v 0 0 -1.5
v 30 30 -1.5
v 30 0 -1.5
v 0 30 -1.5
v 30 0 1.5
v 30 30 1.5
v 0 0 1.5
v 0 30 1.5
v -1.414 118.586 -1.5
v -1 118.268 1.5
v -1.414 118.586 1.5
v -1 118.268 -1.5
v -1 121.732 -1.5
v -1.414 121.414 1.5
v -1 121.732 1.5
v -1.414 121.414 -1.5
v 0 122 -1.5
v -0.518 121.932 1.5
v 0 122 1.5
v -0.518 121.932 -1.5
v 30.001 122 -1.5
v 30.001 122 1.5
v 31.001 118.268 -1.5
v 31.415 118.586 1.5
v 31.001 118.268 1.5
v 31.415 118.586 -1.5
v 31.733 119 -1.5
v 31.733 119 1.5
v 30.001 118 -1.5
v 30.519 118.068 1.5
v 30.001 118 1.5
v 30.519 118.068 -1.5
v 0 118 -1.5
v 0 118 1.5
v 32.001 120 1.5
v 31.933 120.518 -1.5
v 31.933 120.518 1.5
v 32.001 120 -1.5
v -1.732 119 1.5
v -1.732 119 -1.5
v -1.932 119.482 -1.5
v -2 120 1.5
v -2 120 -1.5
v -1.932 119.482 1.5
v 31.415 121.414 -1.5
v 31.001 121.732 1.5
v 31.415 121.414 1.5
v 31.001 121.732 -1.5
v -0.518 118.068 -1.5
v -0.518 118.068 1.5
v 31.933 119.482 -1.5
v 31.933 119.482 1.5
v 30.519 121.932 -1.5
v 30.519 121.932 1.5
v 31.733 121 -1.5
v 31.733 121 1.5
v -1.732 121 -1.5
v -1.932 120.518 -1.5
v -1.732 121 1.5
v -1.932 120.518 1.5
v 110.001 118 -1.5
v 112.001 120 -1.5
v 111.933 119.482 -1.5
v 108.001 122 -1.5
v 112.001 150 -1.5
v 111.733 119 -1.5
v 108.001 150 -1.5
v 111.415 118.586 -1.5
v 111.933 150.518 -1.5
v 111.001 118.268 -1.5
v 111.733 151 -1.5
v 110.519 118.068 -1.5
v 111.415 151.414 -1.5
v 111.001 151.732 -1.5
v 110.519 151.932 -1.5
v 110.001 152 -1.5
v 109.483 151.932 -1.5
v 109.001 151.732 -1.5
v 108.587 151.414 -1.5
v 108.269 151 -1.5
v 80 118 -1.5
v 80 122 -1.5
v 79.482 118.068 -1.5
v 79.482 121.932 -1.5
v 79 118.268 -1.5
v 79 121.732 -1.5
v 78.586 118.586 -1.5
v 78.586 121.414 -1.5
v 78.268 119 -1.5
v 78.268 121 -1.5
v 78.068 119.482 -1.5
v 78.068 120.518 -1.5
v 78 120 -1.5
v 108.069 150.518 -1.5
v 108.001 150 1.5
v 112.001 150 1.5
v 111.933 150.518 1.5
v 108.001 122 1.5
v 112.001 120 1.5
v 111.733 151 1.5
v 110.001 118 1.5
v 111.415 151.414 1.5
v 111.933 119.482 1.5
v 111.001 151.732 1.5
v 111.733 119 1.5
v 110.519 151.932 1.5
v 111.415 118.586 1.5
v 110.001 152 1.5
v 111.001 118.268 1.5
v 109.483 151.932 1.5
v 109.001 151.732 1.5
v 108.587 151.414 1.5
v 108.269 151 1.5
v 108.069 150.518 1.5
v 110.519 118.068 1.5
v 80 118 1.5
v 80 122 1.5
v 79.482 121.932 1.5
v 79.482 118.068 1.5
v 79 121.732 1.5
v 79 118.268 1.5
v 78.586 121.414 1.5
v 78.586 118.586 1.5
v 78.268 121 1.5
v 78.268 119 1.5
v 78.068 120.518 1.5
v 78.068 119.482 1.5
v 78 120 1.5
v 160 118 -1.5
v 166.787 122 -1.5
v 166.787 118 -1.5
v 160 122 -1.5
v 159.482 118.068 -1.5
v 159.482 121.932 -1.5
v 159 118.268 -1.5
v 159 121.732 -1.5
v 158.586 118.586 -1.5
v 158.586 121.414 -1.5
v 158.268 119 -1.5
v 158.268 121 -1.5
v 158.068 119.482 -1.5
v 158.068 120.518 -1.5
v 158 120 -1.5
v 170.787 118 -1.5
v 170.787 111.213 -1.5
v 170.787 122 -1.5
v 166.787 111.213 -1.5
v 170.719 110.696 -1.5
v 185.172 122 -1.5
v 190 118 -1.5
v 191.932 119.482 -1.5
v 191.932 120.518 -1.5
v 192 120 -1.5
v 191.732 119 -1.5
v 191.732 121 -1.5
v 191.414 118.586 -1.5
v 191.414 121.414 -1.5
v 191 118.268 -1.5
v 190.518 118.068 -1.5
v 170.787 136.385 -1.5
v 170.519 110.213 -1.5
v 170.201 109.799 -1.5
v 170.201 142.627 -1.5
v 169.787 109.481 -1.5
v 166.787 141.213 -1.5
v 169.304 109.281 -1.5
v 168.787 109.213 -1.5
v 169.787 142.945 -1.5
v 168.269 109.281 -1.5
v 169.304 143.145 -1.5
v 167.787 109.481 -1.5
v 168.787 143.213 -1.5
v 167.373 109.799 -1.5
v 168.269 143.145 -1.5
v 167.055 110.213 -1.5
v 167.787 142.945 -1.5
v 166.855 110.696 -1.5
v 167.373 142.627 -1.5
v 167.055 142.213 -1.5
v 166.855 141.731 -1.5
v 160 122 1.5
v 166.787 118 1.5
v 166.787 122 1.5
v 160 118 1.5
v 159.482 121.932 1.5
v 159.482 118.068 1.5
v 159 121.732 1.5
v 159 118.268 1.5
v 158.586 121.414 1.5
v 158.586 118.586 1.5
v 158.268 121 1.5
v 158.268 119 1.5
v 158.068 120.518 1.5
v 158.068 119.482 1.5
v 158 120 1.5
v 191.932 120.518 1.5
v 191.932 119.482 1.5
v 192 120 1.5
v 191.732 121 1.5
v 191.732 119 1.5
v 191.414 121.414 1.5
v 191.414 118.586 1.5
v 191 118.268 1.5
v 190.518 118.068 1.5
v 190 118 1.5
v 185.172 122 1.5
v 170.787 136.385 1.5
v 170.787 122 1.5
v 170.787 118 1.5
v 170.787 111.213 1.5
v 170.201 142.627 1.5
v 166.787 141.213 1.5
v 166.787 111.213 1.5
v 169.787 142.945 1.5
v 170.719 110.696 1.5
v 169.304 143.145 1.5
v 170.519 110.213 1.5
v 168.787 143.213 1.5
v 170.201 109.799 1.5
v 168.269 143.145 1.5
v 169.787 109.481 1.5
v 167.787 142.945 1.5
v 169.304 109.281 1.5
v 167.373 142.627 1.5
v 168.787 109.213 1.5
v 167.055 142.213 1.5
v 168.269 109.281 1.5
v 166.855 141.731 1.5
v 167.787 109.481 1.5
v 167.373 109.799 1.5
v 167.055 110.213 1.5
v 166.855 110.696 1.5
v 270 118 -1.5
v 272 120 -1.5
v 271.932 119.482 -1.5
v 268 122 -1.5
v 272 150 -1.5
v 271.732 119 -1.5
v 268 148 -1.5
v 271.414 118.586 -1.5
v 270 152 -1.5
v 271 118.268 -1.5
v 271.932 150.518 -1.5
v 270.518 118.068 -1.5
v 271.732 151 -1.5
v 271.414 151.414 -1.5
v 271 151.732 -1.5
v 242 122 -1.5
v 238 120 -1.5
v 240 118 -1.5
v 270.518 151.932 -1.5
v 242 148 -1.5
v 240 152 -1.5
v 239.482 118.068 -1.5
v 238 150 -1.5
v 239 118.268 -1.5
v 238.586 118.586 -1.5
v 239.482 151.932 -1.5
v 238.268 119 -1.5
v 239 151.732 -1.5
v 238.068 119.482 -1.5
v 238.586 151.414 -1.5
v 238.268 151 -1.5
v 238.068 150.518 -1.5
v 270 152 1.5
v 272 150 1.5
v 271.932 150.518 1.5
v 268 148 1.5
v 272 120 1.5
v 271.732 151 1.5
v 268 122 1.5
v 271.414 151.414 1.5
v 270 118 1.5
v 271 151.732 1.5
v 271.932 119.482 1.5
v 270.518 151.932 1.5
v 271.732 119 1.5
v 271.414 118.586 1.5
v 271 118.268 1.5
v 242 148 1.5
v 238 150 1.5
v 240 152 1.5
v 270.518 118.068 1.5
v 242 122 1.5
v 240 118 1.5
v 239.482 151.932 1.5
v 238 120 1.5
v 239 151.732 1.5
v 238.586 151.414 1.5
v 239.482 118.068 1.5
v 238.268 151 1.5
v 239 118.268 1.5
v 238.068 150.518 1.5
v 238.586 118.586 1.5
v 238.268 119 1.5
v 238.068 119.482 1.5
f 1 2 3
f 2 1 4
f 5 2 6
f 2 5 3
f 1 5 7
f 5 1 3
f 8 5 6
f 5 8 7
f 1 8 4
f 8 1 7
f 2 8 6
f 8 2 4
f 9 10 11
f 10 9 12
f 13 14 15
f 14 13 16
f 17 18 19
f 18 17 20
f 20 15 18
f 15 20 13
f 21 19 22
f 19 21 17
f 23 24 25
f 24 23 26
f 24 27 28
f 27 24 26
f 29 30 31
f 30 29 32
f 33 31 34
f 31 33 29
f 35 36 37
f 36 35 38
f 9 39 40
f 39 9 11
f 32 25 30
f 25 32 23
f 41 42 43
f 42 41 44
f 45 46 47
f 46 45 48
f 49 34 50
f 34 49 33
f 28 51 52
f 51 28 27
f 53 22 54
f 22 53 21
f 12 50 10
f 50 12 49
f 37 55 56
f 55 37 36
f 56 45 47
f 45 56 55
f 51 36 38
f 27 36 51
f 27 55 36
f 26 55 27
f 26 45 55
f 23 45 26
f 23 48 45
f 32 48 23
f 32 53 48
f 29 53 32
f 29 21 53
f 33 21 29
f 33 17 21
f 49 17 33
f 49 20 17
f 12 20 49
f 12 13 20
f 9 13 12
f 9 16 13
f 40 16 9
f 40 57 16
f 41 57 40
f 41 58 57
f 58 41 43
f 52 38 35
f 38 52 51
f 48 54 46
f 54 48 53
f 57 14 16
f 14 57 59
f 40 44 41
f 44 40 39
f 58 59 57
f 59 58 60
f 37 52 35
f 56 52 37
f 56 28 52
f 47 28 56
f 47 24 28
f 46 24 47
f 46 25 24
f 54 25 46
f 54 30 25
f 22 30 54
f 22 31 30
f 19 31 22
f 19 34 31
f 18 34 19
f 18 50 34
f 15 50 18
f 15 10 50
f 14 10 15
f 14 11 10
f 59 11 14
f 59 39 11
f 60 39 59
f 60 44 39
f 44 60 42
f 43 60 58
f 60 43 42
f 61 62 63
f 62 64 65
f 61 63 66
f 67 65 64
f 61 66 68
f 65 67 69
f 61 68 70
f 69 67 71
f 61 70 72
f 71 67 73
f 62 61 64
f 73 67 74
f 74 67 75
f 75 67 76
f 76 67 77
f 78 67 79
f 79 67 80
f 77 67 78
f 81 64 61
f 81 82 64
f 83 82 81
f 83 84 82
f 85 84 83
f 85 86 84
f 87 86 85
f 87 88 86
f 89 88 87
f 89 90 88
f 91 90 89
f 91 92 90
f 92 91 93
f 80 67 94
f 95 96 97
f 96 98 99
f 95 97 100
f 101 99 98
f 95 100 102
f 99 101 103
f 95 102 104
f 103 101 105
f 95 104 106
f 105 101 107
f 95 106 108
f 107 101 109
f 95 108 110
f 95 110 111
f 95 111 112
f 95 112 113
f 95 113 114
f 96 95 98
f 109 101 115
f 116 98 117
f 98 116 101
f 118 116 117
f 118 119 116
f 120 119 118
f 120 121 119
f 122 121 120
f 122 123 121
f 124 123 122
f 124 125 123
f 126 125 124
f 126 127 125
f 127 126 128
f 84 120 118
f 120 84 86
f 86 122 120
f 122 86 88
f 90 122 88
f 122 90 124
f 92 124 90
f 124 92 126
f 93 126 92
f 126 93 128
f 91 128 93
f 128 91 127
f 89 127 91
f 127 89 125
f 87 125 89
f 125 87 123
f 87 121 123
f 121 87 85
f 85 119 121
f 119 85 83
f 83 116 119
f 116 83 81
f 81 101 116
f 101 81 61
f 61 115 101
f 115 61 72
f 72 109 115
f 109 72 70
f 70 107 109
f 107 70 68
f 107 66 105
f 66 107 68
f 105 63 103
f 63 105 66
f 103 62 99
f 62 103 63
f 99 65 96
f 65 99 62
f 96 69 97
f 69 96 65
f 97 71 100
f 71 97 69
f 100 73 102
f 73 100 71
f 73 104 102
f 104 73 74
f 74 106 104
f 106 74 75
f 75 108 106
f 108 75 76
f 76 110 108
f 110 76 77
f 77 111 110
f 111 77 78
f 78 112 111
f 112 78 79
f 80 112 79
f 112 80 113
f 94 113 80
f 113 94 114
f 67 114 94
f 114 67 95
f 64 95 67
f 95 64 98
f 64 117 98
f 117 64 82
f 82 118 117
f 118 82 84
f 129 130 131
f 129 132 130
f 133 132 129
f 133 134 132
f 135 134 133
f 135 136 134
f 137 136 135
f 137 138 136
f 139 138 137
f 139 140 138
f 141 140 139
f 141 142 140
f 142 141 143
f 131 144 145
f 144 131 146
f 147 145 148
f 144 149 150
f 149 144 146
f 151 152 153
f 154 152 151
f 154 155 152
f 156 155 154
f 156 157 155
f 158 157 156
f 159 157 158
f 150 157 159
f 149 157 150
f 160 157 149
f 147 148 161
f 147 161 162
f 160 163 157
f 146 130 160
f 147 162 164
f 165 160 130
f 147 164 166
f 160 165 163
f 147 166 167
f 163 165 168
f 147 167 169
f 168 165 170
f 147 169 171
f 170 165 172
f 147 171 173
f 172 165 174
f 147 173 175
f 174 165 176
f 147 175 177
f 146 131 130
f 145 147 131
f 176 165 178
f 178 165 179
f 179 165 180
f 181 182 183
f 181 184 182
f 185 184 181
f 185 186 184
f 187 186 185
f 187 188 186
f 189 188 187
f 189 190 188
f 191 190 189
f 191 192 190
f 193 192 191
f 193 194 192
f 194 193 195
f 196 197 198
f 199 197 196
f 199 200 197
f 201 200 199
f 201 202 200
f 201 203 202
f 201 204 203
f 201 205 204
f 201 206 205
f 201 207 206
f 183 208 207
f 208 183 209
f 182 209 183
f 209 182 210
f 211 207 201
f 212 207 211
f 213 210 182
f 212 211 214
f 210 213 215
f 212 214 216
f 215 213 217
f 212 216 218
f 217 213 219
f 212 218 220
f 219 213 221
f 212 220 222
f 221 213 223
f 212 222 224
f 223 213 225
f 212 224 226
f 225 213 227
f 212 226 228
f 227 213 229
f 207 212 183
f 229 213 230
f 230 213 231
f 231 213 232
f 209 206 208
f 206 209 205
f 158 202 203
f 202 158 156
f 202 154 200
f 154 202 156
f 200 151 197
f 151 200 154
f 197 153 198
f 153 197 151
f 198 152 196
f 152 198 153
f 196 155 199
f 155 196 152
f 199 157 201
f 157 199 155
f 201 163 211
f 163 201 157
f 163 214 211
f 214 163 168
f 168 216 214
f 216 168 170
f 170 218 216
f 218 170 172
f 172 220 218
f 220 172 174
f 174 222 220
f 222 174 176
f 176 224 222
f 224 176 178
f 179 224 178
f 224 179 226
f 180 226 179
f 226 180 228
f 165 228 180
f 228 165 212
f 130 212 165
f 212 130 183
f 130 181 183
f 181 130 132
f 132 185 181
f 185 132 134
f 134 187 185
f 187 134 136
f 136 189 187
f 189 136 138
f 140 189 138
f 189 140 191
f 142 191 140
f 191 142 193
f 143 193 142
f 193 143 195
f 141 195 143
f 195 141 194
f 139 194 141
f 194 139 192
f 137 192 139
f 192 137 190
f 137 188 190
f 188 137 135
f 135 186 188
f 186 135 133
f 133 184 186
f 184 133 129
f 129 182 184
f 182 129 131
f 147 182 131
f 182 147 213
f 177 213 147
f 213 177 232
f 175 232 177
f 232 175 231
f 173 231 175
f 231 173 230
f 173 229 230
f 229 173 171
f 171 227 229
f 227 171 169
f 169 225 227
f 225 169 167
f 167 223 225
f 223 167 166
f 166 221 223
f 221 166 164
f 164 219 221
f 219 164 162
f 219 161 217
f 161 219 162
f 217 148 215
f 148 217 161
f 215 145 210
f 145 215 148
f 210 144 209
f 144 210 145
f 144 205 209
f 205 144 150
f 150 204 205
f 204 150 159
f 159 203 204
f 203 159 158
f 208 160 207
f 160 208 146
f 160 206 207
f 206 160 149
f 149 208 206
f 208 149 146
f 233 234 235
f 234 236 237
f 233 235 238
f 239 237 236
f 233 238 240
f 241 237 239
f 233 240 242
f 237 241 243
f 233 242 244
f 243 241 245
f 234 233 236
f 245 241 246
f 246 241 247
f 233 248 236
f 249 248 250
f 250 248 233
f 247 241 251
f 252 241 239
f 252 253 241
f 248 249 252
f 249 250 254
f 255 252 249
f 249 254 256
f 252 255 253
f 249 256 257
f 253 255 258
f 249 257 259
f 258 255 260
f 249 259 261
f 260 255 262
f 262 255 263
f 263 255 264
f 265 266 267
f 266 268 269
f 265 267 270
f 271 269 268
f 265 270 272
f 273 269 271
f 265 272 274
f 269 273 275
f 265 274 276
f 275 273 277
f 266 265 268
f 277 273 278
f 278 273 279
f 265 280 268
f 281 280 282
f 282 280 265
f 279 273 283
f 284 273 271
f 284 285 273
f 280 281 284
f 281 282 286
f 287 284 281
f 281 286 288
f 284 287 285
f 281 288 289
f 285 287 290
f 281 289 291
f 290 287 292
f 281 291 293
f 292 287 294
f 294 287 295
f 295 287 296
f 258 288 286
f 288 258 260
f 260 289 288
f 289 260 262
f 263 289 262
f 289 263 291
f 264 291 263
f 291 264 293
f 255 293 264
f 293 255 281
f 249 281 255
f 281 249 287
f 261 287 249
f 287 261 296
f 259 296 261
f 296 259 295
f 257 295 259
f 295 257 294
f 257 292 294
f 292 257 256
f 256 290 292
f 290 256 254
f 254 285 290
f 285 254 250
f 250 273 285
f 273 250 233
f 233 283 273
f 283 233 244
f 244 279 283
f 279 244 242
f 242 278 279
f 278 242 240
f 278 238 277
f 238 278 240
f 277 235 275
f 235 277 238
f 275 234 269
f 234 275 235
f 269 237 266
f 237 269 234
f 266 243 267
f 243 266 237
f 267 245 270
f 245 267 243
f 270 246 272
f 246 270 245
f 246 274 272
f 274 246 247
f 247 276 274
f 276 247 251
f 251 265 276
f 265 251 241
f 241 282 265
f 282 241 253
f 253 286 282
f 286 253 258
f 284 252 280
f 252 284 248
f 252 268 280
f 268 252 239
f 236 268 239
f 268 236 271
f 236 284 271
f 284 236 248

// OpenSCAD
// ============================================================================
// LogoSC-Experiments.scad
//
// Experimental and exploratory tests for LogoSC.
//
// This file is meant to be opened directly in OpenSCAD. It imports the current
// LogoSC core, defines small experimental command lists, and renders them with
// RenderAllLogoExperiments().
//
// Keep experimental work here until it is stable enough to move into the core,
// formal tests, or the main examples gallery.
// ============================================================================

// Keep the regression-test grid and trace output out of the experiments view
// when this file is opened directly.
include <LogoSC-Foundation-Core.scad>
LogoSCRunMode = "NoDemo";
TraceLevel = 0; // [0:4]

// -----------------------------------------------------------------------------
// Experiment controls
// -----------------------------------------------------------------------------

RunLogoExperiments = true;

LogoExperimentHeight = 3;
LogoExperimentConvexity = 10;
LogoExperimentXStep = 80;
LogoExperimentYStep = 60;
StrokeTestEpsilon = 0.001;
CapsuleStrokeWidth = 4;
CapsuleStrokeFn = 24;

LogoExperimentColor0 = "red";
LogoExperimentColor1 = "orange";
LogoExperimentColor2 = "gold";
LogoExperimentColor3 = "green";
LogoExperimentColor4 = "cyan";
LogoExperimentColor5 = "blue";
LogoExperimentColor6 = "violet";
LogoExperimentColor7 = "magenta";
LogoExperimentColor8 = "brown";
LogoExperimentColor9 = "gray";
LogoExperimentColorMax = "black";

LogoExperimentColors =
[
    LogoExperimentColor0,
    LogoExperimentColor1,
    LogoExperimentColor2,
    LogoExperimentColor3,
    LogoExperimentColor4,
    LogoExperimentColor5,
    LogoExperimentColor6,
    LogoExperimentColor7,
    LogoExperimentColor8,
    LogoExperimentColor9
];

function LogoExperimentColor(index) =
    index >= 0 && index < len(LogoExperimentColors)
        ? LogoExperimentColors[floor(index)]
        : LogoExperimentColorMax;

function LogoExperimentGridOffset(index) =
[
    index[0] * LogoExperimentXStep,
    index[1] * LogoExperimentYStep
];

// -----------------------------------------------------------------------------
// Experimental geometry helpers
// -----------------------------------------------------------------------------

// Returns the input point list followed by the same points in reverse order.
// The repeated endpoint and start point are intentional: this creates the
// zero-area, doubled-back polygon used by the experimental stroke test.
function LogoSCReverseAppendPoints(points) =
    len(points) == 0
        ? []
        : concat(
            points,
            [for (i = [len(points) - 1 : -1 : 0]) points[i]]
        );

// Report that stroke conversion cannot preserve holes. In normal experiment
// mode the holes are discarded after a warning; HardErrors converts the same
// condition into an assertion failure.
function LogoSCWarnDiscardedStrokeHoles(region) =
    len(region) <= 1
        ? 0
        : HardErrors
            ? assert(
                false,
                str(
                    "Experimental stroke conversion discards ",
                    len(region) - 1,
                    " hole contour(s)"
                )
            ) 0
            : echo(
                "[WARNING]",
                "Experimental stroke conversion discards holes",
                len(region) - 1
            ) 0;

// Convert evaluated LogoSC regions into zero-width doubled-back regions.
//
// Input is normally ResultContours(evalLogo(cmds)). Each region's outer
// contour is reverse-appended and all hole contours are intentionally dropped.
// Complexity: O(P + H), where P is the number of outer points and H is the
// number of hole contours inspected.
// Precondition: regions uses LogoSC's [outer, hole0, ...] region structure.
// Postcondition: every returned region contains exactly one doubled-back outer
// contour and no holes.
function LogoSCReverseAppendRegions(regions) =
[
    for (region = regions)
        let(_warning = LogoSCWarnDiscardedStrokeHoles(region))
            MakeRegion(LogoSCReverseAppendPoints(RegionOuter(region)))
];



// Render one point list as the union of circular capsules. Each segment is the
// hull of two endpoint circles, producing round caps and round joins without
// explicit miter or fillet calculations.
// Complexity: O(N) hull operations for N points.
// Precondition: points contains 2D coordinate pairs and width is positive.
// Postcondition: emits a valid 2D stroked region centered on the input path.
module RenderCapsuleStrokePath(
    points,
    width = CapsuleStrokeWidth,
    fn = CapsuleStrokeFn)
{
    radius = width / 2;

    assert(width > 0, "Capsule stroke width must be positive");

    if (len(points) == 1)
    {
        translate(points[0])
        {
            circle(r = radius, $fn = fn);
        }
    }

    if (len(points) >= 2)
    {
        union()
        {
            for (i = [0 : len(points) - 2])
            {
                hull()
                {
                    translate(points[i])
                    {
                        circle(r = radius, $fn = fn);
                    }

                    translate(points[i + 1])
                    {
                        circle(r = radius, $fn = fn);
                    }
                }
            }
        }
    }
}

// Return the index of the first region with a nonempty outer contour.
// Complexity: O(R), where R is the number of regions.
// Precondition: regions uses LogoSC's region structure.
// Postcondition: returns -1 if no nonempty outer contour exists.
function LogoSCFirstNonemptyRegionIndex(regions, index = 0) =
    index >= len(regions)
        ? -1
        : len(RegionOuter(regions[index])) > 0
            ? index
            : LogoSCFirstNonemptyRegionIndex(regions, index + 1);

// Render evaluated LogoSC regions as capsule strokes using each region's outer
// contour as a centerline. Hole contours are warned about and discarded.
//
// The normal filled-region evaluator records MOVE destinations but does not
// seed the first mutable contour with the turtle's initial position. When
// addInitialPoint is true, initialPoint is prepended to only the first nonempty
// contour. Later contours created by PENUP/PENDOWN already include their own
// starting point and are left unchanged.
// Complexity: O(P + R) hull operations/search across P points and R regions.
// Precondition: regions uses LogoSC's [outer, hole0, ...] region structure.
// Postcondition: emits stroked 2D geometry for every nonempty outer contour.
module RenderCapsuleStrokeRegions(
    regions,
    width = CapsuleStrokeWidth,
    fn = CapsuleStrokeFn,
    addInitialPoint = true,
    initialPoint = [0, 0])
{
    firstRegionIndex = addInitialPoint
        ? LogoSCFirstNonemptyRegionIndex(regions)
        : -1;

    for (regionIndex = [0 : len(regions) - 1])
    {
        region = regions[regionIndex];
        _warning = LogoSCWarnDiscardedStrokeHoles(region);
        outer = RegionOuter(region);
        strokePoints = regionIndex == firstRegionIndex
            ? concat([initialPoint], outer)
            : outer;

        if (len(strokePoints) > 0)
        {
            RenderCapsuleStrokePath(strokePoints, width = width, fn = fn);
        }
    }
}

// -----------------------------------------------------------------------------
// Experimental command lists
// -----------------------------------------------------------------------------

// Minimal smoke test: draw a 30 x 30 square using only relative LogoSC movement
// and turns. The final TURN restores the original heading.
ExperimentSquare =
[
    [MOVE, 30],
    [TURN, 90],
    [MOVE, 30],
    [TURN, 90],
    [MOVE, 30],
    [TURN, 90],
    [MOVE, 30],
    [TURN, 90]
];

// Zero-width stroke inputs. Each list is evaluated normally, then every outer
// point list is reverse-appended before being passed to the polygon renderer.
ExperimentStrokeLine =
[
    [MOVE, StrokeTestEpsilon],
    [MOVE, 30]
];

ExperimentStrokeBentLine =
[
    [MOVE, StrokeTestEpsilon],
    [MOVE, 30],
    [TURN, 90],
    [MOVE, 30]
];

ExperimentStrokeCrossedLine =
[
    [MOVE, 30],
    [TURN, 135],
    [MOVE, 30],
    [TURN, 135],
    [MOVE, 30]
];

ExperimentStrokeClosedSquare =
[
    [MOVE, 30],
    [TURN, 90],
    [MOVE, 30],
    [TURN, 90],
    [MOVE, 30],
    [TURN, 90],
    [MOVE, 30],
    [TURN, 90]
];

// -----------------------------------------------------------------------------
// Rendering helpers
// -----------------------------------------------------------------------------

module RenderLogoExperiment(
    experimentName,
    cmds,
    index,
    height = LogoExperimentHeight,
    experimentScale = 1,
    experimentColor = undef)
{
    offset = LogoExperimentGridOffset(index);
    useColor = experimentColor == undef
        ? LogoExperimentColor(index[0])
        : experimentColor;

    echo("");
    echo("============================================================");
    echo("LogoExperiment:", experimentName);
    echo("Index:", index);
    echo("Offset:", offset);
    echo("Scale:", experimentScale);
    echo("Color:", useColor);
    echo("============================================================");

    translate([offset[0], offset[1], 0])
    {
        color(useColor)
        {
            linear_extrude(
                height = height,
                center = true,
                convexity = LogoExperimentConvexity
            )
            {
                scale([experimentScale, experimentScale])
                {
                    RenderLogo2D(cmds, convexity = LogoExperimentConvexity);
                }
            }
        }
    }
}


// Render a command list after converting each evaluated outer contour into a
// zero-width doubled-back polygon. This is intentionally experimental and may
// expose degenerate-polygon behavior in OpenSCAD/CGAL.
module RenderLogoReverseAppendExperiment(
    experimentName,
    cmds,
    index,
    height = LogoExperimentHeight,
    experimentScale = 1,
    experimentColor = undef)
{
    offset = LogoExperimentGridOffset(index);
    useColor = experimentColor == undef
        ? LogoExperimentColor(index[0])
        : experimentColor;
    result = evalLogo(cmds);
    strokeRegions = LogoSCReverseAppendRegions(ResultContours(result));

    echo("");
    echo("============================================================");
    echo("Logo reverse-append experiment:", experimentName);
    echo("Index:", index);
    echo("Offset:", offset);
    echo("Scale:", experimentScale);
    echo("Color:", useColor);
    echo("============================================================");

    translate([offset[0], offset[1], 0])
    {
        color(useColor)
        {
            linear_extrude(
                height = height,
                center = true,
                convexity = LogoExperimentConvexity
            )
            {
                scale([experimentScale, experimentScale])
                {
                    RenderContours2D(
                        strokeRegions,
                        convexity = LogoExperimentConvexity
                    );
                }
            }
        }
    }
}



// Render a command list as round-ended capsule strokes. This provides a valid
// geometry reference implementation for comparison with the failed zero-width
// reverse-append polygon experiment.
// Complexity: O(P) hull operations across P evaluated path points.
// Precondition: cmds is a valid LogoSC command list and width is positive.
// Postcondition: emits extruded capsule-stroke geometry at the requested grid cell.
module RenderLogoCapsuleExperiment(
    experimentName,
    cmds,
    index,
    width = CapsuleStrokeWidth,
    fn = CapsuleStrokeFn,
    height = LogoExperimentHeight,
    experimentScale = 1,
    experimentColor = undef)
{
    offset = LogoExperimentGridOffset(index);
    useColor = experimentColor == undef
        ? LogoExperimentColor(index[0])
        : experimentColor;
    result = evalLogo(cmds);
    regions = ResultContours(result);

    echo("");
    echo("============================================================");
    echo("Logo capsule-stroke experiment:", experimentName);
    echo("Index:", index);
    echo("Offset:", offset);
    echo("Scale:", experimentScale);
    echo("Width:", width);
    echo("Color:", useColor);
    echo("============================================================");

    translate([offset[0], offset[1], 0])
    {
        color(useColor)
        {
            linear_extrude(
                height = height,
                center = true,
                convexity = LogoExperimentConvexity
            )
            {
                scale([experimentScale, experimentScale])
                {
                    RenderCapsuleStrokeRegions(
                        regions,
                        width = width,
                        fn = fn,
                        addInitialPoint = true,
                        initialPoint = [0, 0]
                    );
                }
            }
        }
    }
}

// Gallery routine similar to RenderAllLogoExamples(), but reserved for work that
// has not yet graduated into the main examples file.
module RenderAllLogoExperiments()
{
    RenderLogoExperiment("square smoke test", ExperimentSquare, [0, 0]);

    RenderLogoReverseAppendExperiment(
        "single line",
        ExperimentStrokeLine,
        [0, 1]
    );
    RenderLogoReverseAppendExperiment(
        "two-line 90-degree bend",
        ExperimentStrokeBentLine,
        [1, 1]
    );
    RenderLogoReverseAppendExperiment(
        "three-line crossed curve",
        ExperimentStrokeCrossedLine,
        [2, 1]
    );
    RenderLogoReverseAppendExperiment(
        "four-line closed square",
        ExperimentStrokeClosedSquare,
        [3, 1]
    );

    RenderLogoCapsuleExperiment(
        "capsule single line",
        ExperimentStrokeLine,
        [0, 2]
    );
    RenderLogoCapsuleExperiment(
        "capsule two-line 90-degree bend",
        ExperimentStrokeBentLine,
        [1, 2]
    );
    RenderLogoCapsuleExperiment(
        "capsule three-line crossed curve",
        ExperimentStrokeCrossedLine,
        [2, 2]
    );
    RenderLogoCapsuleExperiment(
        "capsule four-line closed square",
        ExperimentStrokeClosedSquare,
        [3, 2]
    );
}

if (RunLogoExperiments)
{
    RenderAllLogoExperiments();
}
